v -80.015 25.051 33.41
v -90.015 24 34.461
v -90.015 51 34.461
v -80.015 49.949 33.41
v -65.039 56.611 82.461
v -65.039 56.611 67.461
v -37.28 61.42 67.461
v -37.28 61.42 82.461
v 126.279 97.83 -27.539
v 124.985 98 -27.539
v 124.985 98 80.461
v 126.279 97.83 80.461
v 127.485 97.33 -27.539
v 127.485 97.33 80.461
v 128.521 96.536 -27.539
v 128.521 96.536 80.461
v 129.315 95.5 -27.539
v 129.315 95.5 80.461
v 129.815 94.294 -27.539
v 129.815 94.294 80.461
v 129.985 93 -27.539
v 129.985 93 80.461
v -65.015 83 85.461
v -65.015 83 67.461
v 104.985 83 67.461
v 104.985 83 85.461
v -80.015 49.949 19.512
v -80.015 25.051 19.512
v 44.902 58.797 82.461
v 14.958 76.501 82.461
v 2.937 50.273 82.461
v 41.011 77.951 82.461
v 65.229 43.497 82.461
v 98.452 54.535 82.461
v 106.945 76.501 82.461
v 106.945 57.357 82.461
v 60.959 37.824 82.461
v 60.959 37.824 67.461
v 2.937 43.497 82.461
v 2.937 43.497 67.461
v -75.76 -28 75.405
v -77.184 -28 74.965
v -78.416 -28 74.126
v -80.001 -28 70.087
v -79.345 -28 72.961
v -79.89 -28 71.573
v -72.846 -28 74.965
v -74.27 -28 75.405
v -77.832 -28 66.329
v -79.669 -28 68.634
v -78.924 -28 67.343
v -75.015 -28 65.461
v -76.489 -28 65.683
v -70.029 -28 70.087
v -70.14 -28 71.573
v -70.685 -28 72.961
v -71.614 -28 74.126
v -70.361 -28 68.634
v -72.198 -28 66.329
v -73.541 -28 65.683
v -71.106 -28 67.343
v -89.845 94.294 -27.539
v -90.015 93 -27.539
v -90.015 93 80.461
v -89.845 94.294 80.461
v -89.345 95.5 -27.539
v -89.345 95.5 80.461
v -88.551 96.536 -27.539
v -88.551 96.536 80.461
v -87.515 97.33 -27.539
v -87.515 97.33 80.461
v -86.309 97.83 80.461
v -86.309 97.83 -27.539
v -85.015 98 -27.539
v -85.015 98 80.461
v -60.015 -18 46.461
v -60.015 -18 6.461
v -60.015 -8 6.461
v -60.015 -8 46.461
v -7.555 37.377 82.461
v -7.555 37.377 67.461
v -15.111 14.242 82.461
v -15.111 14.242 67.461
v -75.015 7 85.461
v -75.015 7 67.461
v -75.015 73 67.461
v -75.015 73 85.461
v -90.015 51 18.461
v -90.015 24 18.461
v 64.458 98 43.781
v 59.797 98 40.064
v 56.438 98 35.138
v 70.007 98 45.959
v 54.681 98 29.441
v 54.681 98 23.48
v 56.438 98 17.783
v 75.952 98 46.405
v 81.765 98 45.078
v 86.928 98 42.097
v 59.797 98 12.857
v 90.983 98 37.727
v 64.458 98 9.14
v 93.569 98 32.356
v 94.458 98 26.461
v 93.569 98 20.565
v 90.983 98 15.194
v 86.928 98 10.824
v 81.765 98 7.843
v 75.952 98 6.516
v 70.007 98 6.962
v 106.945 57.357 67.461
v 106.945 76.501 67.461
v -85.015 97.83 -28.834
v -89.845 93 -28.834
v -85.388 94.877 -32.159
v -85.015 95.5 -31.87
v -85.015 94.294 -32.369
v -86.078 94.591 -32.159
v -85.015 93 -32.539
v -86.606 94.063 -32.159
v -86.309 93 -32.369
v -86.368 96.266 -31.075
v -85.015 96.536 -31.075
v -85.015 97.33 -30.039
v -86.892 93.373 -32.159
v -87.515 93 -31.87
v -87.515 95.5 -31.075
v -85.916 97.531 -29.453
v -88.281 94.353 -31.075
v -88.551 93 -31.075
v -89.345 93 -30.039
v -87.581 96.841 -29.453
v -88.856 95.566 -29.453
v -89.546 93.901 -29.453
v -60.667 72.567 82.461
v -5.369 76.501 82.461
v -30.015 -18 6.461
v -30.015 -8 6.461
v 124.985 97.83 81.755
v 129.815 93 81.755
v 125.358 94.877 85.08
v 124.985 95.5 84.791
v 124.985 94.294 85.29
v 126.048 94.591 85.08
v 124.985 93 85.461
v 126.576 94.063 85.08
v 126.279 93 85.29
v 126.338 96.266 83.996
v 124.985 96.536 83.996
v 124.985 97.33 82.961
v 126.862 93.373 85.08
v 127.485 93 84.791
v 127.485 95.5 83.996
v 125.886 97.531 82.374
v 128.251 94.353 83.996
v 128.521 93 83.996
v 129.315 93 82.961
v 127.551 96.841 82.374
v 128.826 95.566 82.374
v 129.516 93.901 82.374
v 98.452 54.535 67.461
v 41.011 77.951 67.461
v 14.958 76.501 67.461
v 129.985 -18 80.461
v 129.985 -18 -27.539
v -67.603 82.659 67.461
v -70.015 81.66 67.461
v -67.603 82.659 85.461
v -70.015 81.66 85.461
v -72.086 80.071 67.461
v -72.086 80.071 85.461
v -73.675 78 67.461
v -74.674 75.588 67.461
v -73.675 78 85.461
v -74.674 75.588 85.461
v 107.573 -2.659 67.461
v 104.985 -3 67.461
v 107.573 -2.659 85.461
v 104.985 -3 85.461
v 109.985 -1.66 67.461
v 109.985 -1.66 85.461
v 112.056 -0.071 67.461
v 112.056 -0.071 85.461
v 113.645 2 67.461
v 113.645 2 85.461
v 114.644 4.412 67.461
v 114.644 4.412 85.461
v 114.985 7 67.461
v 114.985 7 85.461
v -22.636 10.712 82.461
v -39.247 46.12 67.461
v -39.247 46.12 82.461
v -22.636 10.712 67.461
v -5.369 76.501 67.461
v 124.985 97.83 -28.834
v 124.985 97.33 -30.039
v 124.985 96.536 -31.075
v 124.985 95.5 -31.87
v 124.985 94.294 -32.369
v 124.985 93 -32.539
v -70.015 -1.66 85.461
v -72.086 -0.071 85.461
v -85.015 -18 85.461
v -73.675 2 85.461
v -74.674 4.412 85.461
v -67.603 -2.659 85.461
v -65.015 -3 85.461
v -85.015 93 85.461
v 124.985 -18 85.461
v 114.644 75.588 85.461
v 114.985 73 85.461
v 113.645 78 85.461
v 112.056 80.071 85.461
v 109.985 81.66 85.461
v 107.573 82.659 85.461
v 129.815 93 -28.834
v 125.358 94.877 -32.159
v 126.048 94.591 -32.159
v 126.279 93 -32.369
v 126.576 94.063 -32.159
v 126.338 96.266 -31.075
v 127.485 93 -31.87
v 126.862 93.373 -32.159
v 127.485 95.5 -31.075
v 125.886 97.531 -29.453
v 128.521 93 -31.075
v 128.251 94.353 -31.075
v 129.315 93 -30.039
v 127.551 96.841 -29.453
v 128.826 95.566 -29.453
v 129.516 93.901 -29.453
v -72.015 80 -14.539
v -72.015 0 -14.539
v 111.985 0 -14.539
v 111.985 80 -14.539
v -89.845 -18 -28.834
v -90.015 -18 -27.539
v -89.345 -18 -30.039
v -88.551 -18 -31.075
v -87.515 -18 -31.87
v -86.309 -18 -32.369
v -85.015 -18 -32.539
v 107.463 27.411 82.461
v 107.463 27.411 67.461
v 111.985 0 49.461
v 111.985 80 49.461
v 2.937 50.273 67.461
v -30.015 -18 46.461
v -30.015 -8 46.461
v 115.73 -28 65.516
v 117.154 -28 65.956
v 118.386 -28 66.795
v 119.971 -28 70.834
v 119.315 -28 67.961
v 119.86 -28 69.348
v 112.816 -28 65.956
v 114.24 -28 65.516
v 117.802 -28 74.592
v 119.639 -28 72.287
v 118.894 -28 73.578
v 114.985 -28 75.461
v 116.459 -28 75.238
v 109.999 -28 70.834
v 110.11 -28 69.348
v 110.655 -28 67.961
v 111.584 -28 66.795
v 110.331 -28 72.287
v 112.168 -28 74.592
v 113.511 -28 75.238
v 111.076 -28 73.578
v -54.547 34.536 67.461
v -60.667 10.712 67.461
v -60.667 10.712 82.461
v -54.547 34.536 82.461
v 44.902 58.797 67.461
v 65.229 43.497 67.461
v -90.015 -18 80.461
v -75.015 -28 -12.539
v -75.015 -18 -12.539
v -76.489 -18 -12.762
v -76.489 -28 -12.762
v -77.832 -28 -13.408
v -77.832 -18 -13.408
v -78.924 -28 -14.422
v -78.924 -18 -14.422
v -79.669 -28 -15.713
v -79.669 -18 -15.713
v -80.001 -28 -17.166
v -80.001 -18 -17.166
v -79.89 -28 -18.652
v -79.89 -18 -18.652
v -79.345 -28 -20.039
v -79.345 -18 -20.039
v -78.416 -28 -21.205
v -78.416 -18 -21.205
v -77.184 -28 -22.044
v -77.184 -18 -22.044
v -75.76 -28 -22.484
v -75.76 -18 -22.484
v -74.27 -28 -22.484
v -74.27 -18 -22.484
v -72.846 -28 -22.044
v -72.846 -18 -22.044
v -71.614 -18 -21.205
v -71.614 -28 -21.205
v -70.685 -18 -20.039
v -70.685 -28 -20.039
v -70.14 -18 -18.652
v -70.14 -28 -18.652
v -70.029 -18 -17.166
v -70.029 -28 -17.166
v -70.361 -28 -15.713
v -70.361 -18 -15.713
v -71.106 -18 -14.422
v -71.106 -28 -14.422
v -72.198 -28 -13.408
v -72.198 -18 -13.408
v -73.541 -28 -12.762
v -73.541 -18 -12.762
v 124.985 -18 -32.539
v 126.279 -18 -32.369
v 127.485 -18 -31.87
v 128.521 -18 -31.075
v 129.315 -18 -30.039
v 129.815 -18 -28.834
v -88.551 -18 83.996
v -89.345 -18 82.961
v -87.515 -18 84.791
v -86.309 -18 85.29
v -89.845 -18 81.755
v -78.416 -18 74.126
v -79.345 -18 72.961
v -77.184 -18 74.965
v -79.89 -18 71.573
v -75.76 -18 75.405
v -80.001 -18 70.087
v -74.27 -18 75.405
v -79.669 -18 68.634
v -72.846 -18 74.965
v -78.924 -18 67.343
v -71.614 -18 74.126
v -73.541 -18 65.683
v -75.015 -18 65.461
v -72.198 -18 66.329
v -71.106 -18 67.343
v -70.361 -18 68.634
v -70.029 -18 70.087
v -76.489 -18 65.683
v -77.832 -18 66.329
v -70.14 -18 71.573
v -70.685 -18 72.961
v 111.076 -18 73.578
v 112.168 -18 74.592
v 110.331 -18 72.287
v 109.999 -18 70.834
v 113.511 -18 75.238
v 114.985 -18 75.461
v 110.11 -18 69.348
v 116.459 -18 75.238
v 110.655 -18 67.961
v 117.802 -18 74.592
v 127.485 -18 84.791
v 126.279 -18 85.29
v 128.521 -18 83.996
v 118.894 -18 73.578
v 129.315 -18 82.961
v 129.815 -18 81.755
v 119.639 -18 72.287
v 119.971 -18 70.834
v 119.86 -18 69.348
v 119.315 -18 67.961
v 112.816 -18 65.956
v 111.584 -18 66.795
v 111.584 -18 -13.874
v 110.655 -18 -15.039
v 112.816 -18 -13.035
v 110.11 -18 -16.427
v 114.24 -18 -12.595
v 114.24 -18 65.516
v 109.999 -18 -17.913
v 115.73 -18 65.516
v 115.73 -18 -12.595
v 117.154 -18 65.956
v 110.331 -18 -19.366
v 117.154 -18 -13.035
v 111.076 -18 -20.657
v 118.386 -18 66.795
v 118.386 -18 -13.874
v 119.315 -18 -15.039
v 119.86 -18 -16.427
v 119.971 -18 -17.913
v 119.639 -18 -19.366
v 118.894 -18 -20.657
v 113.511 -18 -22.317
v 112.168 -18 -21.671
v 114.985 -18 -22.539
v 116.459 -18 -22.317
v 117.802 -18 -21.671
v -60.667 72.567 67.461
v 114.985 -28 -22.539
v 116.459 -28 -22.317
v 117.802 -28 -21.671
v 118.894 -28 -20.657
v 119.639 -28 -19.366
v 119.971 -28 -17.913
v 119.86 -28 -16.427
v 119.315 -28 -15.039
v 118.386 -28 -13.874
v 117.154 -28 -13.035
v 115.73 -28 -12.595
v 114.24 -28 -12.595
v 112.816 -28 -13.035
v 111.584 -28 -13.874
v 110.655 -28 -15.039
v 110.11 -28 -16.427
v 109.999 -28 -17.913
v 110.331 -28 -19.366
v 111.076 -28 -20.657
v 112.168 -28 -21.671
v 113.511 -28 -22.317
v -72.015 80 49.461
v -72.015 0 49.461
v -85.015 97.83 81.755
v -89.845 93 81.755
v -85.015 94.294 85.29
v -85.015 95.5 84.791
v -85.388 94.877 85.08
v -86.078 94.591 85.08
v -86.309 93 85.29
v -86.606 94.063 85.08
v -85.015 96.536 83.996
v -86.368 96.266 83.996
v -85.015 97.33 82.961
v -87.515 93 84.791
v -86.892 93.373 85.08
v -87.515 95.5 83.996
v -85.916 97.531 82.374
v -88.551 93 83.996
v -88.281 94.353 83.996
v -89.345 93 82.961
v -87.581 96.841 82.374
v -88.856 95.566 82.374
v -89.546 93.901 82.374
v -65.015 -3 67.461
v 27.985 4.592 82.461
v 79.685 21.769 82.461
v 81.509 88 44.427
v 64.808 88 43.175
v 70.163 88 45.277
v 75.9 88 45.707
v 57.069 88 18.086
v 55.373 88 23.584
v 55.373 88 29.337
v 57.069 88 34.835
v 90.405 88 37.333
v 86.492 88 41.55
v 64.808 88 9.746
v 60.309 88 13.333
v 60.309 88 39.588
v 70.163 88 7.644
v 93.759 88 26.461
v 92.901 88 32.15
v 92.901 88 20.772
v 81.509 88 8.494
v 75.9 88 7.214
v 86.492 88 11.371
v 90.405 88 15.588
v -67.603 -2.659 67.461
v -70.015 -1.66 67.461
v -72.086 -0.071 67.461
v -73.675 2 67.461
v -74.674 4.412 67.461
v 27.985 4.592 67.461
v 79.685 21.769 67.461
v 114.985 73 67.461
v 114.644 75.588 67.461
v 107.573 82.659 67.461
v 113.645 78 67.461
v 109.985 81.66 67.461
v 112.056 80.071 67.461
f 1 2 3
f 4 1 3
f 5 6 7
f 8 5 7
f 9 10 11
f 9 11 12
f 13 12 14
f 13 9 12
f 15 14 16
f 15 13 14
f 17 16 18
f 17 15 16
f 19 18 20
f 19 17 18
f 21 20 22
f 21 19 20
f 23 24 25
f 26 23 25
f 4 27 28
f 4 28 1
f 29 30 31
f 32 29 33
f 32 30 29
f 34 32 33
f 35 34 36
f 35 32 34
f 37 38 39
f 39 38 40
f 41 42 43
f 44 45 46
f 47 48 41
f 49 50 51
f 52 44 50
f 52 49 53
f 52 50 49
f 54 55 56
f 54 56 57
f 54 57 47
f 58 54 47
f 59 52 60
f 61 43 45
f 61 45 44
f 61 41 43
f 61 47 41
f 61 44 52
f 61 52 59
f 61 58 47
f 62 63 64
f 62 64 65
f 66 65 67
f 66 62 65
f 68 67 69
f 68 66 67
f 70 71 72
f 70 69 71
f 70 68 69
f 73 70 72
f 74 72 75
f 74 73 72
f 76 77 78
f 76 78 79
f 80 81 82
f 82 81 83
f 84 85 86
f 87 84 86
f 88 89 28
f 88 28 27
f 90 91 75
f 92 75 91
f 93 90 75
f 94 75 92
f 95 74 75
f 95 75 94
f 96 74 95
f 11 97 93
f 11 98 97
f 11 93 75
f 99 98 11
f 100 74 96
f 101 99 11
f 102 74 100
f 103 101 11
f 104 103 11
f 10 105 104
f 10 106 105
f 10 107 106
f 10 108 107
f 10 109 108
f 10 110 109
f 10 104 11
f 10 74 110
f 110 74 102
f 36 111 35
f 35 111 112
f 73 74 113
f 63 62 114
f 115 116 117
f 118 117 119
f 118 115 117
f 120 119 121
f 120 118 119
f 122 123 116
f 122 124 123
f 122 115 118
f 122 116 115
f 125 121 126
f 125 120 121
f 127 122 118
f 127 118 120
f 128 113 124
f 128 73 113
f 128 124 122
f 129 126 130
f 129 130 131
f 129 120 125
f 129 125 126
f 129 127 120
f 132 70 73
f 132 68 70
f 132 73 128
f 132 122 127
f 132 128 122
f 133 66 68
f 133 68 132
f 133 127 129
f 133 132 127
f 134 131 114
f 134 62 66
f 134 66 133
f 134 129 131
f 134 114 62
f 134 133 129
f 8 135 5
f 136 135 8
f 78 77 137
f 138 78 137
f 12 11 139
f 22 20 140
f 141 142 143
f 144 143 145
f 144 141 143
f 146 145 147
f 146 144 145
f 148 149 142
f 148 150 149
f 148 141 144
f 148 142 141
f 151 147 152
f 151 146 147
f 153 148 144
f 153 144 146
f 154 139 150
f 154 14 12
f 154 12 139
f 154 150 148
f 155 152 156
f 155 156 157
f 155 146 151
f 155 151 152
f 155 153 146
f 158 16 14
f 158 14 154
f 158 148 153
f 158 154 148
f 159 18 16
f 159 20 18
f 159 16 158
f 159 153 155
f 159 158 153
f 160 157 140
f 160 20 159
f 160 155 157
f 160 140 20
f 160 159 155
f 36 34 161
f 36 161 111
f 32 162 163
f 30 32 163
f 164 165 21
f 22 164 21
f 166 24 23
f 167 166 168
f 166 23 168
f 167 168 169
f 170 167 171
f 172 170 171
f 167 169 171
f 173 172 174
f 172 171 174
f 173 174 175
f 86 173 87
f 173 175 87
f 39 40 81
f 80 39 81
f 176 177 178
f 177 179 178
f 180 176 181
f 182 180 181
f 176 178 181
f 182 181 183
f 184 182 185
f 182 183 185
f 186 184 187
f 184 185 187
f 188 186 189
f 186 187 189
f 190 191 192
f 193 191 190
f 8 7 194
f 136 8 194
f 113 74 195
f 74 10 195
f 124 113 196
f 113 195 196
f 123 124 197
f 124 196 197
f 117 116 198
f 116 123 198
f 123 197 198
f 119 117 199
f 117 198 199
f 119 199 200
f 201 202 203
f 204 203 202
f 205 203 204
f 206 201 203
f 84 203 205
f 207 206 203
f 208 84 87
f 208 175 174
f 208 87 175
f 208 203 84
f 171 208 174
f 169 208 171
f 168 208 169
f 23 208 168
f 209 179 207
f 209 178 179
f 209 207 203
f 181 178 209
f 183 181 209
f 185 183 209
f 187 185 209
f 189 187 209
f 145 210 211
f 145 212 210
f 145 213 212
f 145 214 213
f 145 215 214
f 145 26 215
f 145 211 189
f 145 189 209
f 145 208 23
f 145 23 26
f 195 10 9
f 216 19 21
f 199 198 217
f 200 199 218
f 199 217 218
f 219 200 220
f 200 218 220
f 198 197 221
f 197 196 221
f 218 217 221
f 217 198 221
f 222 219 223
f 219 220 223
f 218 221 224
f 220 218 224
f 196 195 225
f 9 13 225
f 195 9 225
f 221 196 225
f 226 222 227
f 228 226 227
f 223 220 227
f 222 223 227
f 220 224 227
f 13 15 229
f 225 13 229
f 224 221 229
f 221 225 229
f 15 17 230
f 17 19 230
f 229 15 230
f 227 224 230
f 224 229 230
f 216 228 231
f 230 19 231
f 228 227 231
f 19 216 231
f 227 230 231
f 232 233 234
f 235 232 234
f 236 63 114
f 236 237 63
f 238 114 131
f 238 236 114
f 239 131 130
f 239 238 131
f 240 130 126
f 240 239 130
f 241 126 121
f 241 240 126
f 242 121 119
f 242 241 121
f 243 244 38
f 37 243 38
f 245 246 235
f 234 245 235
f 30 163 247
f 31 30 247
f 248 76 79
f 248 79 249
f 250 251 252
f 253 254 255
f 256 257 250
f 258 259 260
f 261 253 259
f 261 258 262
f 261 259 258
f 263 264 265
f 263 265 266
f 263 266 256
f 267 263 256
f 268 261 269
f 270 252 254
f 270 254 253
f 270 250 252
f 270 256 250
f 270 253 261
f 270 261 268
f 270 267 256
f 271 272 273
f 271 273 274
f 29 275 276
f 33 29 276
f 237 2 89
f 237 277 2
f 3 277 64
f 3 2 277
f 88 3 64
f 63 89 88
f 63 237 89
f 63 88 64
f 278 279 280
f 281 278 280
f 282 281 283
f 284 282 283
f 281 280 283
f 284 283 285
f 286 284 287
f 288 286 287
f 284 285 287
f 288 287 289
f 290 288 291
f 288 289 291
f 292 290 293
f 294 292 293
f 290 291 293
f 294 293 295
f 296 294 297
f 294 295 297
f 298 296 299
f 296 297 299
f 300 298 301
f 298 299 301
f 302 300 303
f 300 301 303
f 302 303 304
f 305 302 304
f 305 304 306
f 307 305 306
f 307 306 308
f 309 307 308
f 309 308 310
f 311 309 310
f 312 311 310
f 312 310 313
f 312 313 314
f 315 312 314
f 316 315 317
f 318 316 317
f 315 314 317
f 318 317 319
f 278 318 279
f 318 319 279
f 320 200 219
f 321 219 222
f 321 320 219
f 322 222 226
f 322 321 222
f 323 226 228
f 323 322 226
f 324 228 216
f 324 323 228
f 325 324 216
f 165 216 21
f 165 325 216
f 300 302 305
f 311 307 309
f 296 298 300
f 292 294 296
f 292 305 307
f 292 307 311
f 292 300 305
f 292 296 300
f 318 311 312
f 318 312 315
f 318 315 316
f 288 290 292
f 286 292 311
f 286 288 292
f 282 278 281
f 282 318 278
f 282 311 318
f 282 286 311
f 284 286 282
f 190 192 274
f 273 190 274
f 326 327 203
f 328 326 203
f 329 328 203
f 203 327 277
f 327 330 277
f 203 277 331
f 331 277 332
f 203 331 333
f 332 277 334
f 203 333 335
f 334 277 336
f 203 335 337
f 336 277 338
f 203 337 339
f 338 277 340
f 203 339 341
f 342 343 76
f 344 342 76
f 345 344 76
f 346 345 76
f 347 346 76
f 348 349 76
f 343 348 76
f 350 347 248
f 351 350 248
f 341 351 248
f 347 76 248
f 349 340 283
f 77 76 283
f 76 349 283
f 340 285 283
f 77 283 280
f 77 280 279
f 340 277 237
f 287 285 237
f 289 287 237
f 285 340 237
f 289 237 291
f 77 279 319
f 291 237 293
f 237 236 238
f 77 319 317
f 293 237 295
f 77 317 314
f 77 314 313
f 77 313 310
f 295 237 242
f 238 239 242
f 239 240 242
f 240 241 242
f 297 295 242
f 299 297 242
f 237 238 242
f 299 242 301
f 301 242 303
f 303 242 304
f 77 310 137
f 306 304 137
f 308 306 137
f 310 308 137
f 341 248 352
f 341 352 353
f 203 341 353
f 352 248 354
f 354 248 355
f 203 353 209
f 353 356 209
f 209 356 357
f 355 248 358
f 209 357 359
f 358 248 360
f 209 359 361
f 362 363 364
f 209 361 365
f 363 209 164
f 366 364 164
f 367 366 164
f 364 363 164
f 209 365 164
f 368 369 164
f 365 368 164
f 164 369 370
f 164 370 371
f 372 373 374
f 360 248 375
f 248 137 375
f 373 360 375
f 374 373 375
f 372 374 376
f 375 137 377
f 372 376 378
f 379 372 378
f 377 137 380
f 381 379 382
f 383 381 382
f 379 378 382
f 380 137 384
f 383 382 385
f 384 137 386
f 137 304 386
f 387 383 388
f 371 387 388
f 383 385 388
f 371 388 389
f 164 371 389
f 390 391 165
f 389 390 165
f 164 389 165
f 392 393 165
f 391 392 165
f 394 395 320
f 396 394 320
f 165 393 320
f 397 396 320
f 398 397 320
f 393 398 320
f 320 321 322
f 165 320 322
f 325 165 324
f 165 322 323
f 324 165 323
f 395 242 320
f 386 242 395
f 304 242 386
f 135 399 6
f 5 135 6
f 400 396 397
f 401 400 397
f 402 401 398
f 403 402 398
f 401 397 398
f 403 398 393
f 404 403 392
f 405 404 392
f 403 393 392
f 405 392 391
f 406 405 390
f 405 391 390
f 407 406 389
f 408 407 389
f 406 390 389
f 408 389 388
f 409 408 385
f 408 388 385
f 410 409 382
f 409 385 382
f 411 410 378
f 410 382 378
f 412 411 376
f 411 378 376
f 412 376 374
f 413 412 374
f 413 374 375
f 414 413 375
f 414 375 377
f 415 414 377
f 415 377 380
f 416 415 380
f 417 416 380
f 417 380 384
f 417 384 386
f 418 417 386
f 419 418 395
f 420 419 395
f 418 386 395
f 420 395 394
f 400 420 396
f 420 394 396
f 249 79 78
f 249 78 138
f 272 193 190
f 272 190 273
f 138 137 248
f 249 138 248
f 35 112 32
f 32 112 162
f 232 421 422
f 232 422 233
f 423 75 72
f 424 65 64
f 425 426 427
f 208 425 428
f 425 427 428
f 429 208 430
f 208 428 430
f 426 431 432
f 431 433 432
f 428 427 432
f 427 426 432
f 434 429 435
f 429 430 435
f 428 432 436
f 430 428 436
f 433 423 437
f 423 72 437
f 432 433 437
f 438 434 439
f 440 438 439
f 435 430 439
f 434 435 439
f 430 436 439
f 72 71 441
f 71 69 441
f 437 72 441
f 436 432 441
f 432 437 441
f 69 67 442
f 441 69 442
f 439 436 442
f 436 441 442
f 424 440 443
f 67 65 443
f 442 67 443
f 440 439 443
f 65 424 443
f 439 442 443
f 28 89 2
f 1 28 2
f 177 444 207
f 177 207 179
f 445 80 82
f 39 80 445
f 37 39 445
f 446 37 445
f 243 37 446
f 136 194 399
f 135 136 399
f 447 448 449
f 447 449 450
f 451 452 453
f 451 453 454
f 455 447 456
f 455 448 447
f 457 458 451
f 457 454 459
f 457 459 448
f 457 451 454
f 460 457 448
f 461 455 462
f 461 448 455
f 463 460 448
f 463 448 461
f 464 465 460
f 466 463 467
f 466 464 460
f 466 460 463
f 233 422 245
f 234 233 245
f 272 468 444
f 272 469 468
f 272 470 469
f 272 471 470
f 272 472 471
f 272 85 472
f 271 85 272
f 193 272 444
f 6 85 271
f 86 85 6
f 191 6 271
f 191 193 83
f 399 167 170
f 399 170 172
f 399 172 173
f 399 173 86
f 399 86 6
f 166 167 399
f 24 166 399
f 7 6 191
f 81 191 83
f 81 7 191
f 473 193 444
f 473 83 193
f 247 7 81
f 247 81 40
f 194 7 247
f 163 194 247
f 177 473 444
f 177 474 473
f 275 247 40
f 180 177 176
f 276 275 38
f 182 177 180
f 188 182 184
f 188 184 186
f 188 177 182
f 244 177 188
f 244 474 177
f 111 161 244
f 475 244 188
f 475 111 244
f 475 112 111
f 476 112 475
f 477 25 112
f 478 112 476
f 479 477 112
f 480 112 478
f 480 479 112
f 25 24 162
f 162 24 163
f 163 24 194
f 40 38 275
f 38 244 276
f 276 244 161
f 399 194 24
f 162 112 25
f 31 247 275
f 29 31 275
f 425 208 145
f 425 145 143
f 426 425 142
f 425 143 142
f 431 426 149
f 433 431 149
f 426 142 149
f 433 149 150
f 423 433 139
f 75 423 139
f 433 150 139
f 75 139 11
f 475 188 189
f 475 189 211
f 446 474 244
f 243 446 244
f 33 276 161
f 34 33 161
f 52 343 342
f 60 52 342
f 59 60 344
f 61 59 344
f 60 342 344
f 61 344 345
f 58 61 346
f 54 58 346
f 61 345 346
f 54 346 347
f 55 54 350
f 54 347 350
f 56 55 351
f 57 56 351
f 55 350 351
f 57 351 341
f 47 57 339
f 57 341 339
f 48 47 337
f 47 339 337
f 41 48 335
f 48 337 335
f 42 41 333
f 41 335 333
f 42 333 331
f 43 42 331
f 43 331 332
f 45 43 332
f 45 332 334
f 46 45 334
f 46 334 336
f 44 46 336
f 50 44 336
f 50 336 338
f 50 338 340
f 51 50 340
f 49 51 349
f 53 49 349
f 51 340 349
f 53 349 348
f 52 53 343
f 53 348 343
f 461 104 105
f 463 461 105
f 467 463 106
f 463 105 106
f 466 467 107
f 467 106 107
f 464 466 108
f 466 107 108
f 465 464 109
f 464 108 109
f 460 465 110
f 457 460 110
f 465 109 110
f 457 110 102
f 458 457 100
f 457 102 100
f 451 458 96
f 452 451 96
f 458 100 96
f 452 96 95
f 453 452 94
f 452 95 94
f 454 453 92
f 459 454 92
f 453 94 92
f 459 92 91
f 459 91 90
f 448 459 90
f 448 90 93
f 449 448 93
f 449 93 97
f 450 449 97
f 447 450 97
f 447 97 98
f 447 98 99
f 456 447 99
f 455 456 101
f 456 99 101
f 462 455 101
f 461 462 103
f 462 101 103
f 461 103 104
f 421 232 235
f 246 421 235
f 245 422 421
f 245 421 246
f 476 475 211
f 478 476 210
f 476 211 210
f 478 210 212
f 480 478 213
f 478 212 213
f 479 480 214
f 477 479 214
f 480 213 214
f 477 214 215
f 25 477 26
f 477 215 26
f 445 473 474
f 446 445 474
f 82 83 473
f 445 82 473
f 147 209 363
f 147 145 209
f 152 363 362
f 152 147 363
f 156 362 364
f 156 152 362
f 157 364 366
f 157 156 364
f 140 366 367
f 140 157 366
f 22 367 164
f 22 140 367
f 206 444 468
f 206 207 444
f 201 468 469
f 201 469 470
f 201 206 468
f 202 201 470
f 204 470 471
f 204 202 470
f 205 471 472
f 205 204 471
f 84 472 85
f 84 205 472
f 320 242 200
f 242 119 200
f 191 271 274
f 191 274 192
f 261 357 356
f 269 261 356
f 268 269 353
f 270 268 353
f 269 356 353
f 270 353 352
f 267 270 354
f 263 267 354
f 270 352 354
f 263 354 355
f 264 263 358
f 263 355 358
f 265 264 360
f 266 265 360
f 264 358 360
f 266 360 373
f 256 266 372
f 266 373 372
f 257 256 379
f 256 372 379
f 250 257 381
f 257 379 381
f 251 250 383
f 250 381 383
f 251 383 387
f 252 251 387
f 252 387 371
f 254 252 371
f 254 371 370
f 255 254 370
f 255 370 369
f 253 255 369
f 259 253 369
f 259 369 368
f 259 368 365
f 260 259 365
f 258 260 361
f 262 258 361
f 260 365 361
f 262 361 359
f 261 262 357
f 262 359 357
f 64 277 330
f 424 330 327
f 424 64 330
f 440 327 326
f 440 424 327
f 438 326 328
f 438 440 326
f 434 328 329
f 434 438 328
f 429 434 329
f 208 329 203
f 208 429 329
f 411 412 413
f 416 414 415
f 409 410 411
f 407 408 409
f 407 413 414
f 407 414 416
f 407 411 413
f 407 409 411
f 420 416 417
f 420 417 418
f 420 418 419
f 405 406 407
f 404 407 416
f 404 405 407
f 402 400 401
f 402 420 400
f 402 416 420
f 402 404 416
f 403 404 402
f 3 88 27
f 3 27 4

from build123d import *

# Parameters (mm, degrees)
SKETCH1_W           = 220
SKETCH1_H           = 100
SKETCH1_W_2         = 184
SKETCH1_H_2         = 64
BOSS_EXTRUDE1_DEPTH = 80
SKETCH11_W          = 220
SKETCH11_H          = 100
BOSS_EXTRUDE6_DEPTH = 18
SKETCH12_W          = 220
SKETCH12_H          = 100
BOSS_EXTRUDE7_DEPTH = 18
SKETCH2_W           = 220
SKETCH2_H           = 116
SKETCH2_W_2         = 190
SKETCH2_H_2         = 86
BOSS_EXTRUDE2_DEPTH = 18
BOSS_EXTRUDE3_DEPTH = 15
FILLET9_R           = 5
FILLET8_R           = 10
SKETCH13_R          = 5
BOSS_EXTRUDE8_DEPTH = 10
SKETCH14_W          = 16
SKETCH14_H          = 27
CUT_EXTRUDE1_DEPTH  = 10
CUT_EXTRUDE1_DRAFT  = -6
SKETCH15_R          = 20
CUT_EXTRUDE2_DEPTH  = 10
CUT_EXTRUDE2_DRAFT  = -4
SKETCH17_W          = 30
SKETCH17_H          = 40
CUT_EXTRUDE3_DEPTH  = 10


with BuildPart() as part:
    # Sketch1 → Boss-Extrude1 (new body)
    with BuildSketch(Plane(origin=(0, 0, 0), x_dir=(1, 0, 0), z_dir=(0, 1, 0))):
        with Locations((19.985024942, -17.460570406)):
            Rectangle(SKETCH1_W, SKETCH1_H)
        with Locations((19.985024942, -17.460570406)):
            Rectangle(SKETCH1_W_2, SKETCH1_H_2, mode=Mode.SUBTRACT)
    extrude(amount=BOSS_EXTRUDE1_DEPTH)

    # Sketch11 → Boss-Extrude6 (add)
    with BuildSketch(Plane(origin=(0, 80, 0), x_dir=(1, 0, 0), z_dir=(0, 1, 0))):
        with Locations((19.985024942, -17.460570406)):
            Rectangle(SKETCH11_W, SKETCH11_H)
    extrude(amount=BOSS_EXTRUDE6_DEPTH)

    # Sketch12 → Boss-Extrude7 (add)
    with BuildSketch(Plane.XZ):
        with Locations((19.985024942, 17.460570406)):
            Rectangle(SKETCH12_W, SKETCH12_H)
    extrude(amount=BOSS_EXTRUDE7_DEPTH)

    # Sketch2 → Boss-Extrude2 (add)
    with BuildSketch(Plane.XY.offset(67.460570406)):
        with Locations((19.985024942, 40)):
            Rectangle(SKETCH2_W, SKETCH2_H)
        with Locations((19.985024942, 40)):
            Rectangle(SKETCH2_W_2, SKETCH2_H_2, mode=Mode.SUBTRACT)
    extrude(amount=BOSS_EXTRUDE2_DEPTH)

    # Sketch3 → Boss-Extrude3 (add)
    with BuildSketch(Plane.XY.offset(67.460570406)):
        Polygon((14.957915815, 76.501183659), (2.936567903, 50.272788216), (44.902000614, 58.797016735), (65.229007083, 43.497119393), (98.451641312, 54.534902475), (106.944672327, 57.35660028), (106.944672327, 76.501183659), (41.011301547, 77.951227522), align=None)
        Polygon((-60.667291048, 72.566924343), (-65.038690289, 56.611317114), (-37.280305111, 61.419856279), (-5.369090654, 76.501183659), align=None)
        Polygon((-54.547332111, 34.535750949), (-39.247434769, 46.119958937), (-22.636117654, 10.711625088), (-60.667291048, 10.711625088), align=None)
        Polygon((-7.554790274, 37.377160456), (-15.111155502, 14.241854245), (27.984608681, 4.591666151), (79.685296007, 21.768539242), (107.463223985, 27.410930863), (60.959158385, 37.824320409), (2.936567903, 43.497119393), align=None)
    extrude(amount=BOSS_EXTRUDE3_DEPTH)

    # Fillet9
    fillet9_edges = [part.edges().sort_by_distance(p)[0] for p in [
        (-90.014975058, 98, 26.460570406),
        (129.985024942, 98, 26.460570406),
        (19.985024942, 98, -32.539429594),
        (19.985024942, 98, 85.460570406),
        (-90.014975058, 40, 85.460570406),
        (129.985024942, 40, 85.460570406),
        (-90.014975058, 40, -32.539429594),
        (129.985024942, 40, -32.539429594),
    ]]
    fillet(fillet9_edges, radius=FILLET9_R)

    # Fillet8
    fillet8_edges = [part.edges().sort_by_distance(p)[0] for p in [
        (-75.014975058, 83, 76.460570406),
        (114.985024942, 83, 76.460570406),
        (114.985024942, -3, 76.460570406),
        (-75.014975058, -3, 76.460570406),
    ]]
    fillet(fillet8_edges, radius=FILLET8_R)

    # Sketch13 → Boss-Extrude8 (add)
    with BuildSketch(Plane.XZ.offset(18)):
        with Locations(Location((-75.014975058, 70.460570406, 0), (0, 0, 270))):
            Circle(SKETCH13_R)
        with Locations(Location((114.985024942, 70.460570406, 0), (0, 0, 90))):
            Circle(SKETCH13_R)
        with Locations(Location((114.985024942, -17.539429594, 0), (0, 0, 270))):
            Circle(SKETCH13_R)
        with Locations(Location((-75.014975058, -17.539429594, 0), (0, 0, 90))):
            Circle(SKETCH13_R)
    extrude(amount=BOSS_EXTRUDE8_DEPTH)


with BuildPart() as cut_extrude1_tool:
    # Sketch14 → Cut-Extrude1 (with draft: the straight prism first)
    with BuildSketch(Plane.ZY.offset(90.014975058)):
        with Locations((26.460570406, 37.5)):
            Rectangle(SKETCH14_W, SKETCH14_H)
    extrude(amount=-CUT_EXTRUDE1_DEPTH)
    # Cut-Extrude1: the draft: its side faces are tilted about the plane it starts from
    cut_extrude1_sides = [cut_extrude1_tool.faces().sort_by_distance(p)[0] for p in [
        (-85.014975058, 37.5, 18.460570406),
        (-85.014975058, 24, 26.460570406),
        (-85.014975058, 37.5, 34.460570406),
        (-85.014975058, 51, 26.460570406),
    ]]
    draft(cut_extrude1_sides, Plane.ZY.offset(90.014975058), CUT_EXTRUDE1_DRAFT)


with BuildPart() as part_1:
    add(part.part)

    # Cut-Extrude1: cut by cut_extrude1_tool
    add(cut_extrude1_tool.part, mode=Mode.SUBTRACT)


with BuildPart() as cut_extrude2_tool:
    # Sketch15 → Cut-Extrude2 (with draft: the straight prism first)
    with BuildSketch(Plane(origin=(0, 98, 0), x_dir=(1, 0, 0), z_dir=(0, 1, 0))):
        with Locations((74.457875253, -26.460570406)):
            Circle(SKETCH15_R)
    extrude(amount=-CUT_EXTRUDE2_DEPTH)
    # Cut-Extrude2: the draft: its side faces are tilted about the plane it starts from
    cut_extrude2_sides = [cut_extrude2_tool.faces().sort_by_distance(p)[0] for p in [
        (54.457875253, 93, 26.460570406),
    ]]
    draft(cut_extrude2_sides, Plane(origin=(0, 98, 0), x_dir=(1, 0, 0), z_dir=(0, 1, 0)), CUT_EXTRUDE2_DRAFT)


with BuildPart() as part_2:
    add(part_1.part)

    # Cut-Extrude2: cut by cut_extrude2_tool
    add(cut_extrude2_tool.part, mode=Mode.SUBTRACT)

    # Sketch17 → Cut-Extrude3 (cut)
    with BuildSketch(Plane.XZ.offset(18)):
        with Locations((-45.014975058, 26.460570406)):
            Rectangle(SKETCH17_W, SKETCH17_H)
    extrude(amount=-CUT_EXTRUDE3_DEPTH, mode=Mode.SUBTRACT)


solid = part_2.part
